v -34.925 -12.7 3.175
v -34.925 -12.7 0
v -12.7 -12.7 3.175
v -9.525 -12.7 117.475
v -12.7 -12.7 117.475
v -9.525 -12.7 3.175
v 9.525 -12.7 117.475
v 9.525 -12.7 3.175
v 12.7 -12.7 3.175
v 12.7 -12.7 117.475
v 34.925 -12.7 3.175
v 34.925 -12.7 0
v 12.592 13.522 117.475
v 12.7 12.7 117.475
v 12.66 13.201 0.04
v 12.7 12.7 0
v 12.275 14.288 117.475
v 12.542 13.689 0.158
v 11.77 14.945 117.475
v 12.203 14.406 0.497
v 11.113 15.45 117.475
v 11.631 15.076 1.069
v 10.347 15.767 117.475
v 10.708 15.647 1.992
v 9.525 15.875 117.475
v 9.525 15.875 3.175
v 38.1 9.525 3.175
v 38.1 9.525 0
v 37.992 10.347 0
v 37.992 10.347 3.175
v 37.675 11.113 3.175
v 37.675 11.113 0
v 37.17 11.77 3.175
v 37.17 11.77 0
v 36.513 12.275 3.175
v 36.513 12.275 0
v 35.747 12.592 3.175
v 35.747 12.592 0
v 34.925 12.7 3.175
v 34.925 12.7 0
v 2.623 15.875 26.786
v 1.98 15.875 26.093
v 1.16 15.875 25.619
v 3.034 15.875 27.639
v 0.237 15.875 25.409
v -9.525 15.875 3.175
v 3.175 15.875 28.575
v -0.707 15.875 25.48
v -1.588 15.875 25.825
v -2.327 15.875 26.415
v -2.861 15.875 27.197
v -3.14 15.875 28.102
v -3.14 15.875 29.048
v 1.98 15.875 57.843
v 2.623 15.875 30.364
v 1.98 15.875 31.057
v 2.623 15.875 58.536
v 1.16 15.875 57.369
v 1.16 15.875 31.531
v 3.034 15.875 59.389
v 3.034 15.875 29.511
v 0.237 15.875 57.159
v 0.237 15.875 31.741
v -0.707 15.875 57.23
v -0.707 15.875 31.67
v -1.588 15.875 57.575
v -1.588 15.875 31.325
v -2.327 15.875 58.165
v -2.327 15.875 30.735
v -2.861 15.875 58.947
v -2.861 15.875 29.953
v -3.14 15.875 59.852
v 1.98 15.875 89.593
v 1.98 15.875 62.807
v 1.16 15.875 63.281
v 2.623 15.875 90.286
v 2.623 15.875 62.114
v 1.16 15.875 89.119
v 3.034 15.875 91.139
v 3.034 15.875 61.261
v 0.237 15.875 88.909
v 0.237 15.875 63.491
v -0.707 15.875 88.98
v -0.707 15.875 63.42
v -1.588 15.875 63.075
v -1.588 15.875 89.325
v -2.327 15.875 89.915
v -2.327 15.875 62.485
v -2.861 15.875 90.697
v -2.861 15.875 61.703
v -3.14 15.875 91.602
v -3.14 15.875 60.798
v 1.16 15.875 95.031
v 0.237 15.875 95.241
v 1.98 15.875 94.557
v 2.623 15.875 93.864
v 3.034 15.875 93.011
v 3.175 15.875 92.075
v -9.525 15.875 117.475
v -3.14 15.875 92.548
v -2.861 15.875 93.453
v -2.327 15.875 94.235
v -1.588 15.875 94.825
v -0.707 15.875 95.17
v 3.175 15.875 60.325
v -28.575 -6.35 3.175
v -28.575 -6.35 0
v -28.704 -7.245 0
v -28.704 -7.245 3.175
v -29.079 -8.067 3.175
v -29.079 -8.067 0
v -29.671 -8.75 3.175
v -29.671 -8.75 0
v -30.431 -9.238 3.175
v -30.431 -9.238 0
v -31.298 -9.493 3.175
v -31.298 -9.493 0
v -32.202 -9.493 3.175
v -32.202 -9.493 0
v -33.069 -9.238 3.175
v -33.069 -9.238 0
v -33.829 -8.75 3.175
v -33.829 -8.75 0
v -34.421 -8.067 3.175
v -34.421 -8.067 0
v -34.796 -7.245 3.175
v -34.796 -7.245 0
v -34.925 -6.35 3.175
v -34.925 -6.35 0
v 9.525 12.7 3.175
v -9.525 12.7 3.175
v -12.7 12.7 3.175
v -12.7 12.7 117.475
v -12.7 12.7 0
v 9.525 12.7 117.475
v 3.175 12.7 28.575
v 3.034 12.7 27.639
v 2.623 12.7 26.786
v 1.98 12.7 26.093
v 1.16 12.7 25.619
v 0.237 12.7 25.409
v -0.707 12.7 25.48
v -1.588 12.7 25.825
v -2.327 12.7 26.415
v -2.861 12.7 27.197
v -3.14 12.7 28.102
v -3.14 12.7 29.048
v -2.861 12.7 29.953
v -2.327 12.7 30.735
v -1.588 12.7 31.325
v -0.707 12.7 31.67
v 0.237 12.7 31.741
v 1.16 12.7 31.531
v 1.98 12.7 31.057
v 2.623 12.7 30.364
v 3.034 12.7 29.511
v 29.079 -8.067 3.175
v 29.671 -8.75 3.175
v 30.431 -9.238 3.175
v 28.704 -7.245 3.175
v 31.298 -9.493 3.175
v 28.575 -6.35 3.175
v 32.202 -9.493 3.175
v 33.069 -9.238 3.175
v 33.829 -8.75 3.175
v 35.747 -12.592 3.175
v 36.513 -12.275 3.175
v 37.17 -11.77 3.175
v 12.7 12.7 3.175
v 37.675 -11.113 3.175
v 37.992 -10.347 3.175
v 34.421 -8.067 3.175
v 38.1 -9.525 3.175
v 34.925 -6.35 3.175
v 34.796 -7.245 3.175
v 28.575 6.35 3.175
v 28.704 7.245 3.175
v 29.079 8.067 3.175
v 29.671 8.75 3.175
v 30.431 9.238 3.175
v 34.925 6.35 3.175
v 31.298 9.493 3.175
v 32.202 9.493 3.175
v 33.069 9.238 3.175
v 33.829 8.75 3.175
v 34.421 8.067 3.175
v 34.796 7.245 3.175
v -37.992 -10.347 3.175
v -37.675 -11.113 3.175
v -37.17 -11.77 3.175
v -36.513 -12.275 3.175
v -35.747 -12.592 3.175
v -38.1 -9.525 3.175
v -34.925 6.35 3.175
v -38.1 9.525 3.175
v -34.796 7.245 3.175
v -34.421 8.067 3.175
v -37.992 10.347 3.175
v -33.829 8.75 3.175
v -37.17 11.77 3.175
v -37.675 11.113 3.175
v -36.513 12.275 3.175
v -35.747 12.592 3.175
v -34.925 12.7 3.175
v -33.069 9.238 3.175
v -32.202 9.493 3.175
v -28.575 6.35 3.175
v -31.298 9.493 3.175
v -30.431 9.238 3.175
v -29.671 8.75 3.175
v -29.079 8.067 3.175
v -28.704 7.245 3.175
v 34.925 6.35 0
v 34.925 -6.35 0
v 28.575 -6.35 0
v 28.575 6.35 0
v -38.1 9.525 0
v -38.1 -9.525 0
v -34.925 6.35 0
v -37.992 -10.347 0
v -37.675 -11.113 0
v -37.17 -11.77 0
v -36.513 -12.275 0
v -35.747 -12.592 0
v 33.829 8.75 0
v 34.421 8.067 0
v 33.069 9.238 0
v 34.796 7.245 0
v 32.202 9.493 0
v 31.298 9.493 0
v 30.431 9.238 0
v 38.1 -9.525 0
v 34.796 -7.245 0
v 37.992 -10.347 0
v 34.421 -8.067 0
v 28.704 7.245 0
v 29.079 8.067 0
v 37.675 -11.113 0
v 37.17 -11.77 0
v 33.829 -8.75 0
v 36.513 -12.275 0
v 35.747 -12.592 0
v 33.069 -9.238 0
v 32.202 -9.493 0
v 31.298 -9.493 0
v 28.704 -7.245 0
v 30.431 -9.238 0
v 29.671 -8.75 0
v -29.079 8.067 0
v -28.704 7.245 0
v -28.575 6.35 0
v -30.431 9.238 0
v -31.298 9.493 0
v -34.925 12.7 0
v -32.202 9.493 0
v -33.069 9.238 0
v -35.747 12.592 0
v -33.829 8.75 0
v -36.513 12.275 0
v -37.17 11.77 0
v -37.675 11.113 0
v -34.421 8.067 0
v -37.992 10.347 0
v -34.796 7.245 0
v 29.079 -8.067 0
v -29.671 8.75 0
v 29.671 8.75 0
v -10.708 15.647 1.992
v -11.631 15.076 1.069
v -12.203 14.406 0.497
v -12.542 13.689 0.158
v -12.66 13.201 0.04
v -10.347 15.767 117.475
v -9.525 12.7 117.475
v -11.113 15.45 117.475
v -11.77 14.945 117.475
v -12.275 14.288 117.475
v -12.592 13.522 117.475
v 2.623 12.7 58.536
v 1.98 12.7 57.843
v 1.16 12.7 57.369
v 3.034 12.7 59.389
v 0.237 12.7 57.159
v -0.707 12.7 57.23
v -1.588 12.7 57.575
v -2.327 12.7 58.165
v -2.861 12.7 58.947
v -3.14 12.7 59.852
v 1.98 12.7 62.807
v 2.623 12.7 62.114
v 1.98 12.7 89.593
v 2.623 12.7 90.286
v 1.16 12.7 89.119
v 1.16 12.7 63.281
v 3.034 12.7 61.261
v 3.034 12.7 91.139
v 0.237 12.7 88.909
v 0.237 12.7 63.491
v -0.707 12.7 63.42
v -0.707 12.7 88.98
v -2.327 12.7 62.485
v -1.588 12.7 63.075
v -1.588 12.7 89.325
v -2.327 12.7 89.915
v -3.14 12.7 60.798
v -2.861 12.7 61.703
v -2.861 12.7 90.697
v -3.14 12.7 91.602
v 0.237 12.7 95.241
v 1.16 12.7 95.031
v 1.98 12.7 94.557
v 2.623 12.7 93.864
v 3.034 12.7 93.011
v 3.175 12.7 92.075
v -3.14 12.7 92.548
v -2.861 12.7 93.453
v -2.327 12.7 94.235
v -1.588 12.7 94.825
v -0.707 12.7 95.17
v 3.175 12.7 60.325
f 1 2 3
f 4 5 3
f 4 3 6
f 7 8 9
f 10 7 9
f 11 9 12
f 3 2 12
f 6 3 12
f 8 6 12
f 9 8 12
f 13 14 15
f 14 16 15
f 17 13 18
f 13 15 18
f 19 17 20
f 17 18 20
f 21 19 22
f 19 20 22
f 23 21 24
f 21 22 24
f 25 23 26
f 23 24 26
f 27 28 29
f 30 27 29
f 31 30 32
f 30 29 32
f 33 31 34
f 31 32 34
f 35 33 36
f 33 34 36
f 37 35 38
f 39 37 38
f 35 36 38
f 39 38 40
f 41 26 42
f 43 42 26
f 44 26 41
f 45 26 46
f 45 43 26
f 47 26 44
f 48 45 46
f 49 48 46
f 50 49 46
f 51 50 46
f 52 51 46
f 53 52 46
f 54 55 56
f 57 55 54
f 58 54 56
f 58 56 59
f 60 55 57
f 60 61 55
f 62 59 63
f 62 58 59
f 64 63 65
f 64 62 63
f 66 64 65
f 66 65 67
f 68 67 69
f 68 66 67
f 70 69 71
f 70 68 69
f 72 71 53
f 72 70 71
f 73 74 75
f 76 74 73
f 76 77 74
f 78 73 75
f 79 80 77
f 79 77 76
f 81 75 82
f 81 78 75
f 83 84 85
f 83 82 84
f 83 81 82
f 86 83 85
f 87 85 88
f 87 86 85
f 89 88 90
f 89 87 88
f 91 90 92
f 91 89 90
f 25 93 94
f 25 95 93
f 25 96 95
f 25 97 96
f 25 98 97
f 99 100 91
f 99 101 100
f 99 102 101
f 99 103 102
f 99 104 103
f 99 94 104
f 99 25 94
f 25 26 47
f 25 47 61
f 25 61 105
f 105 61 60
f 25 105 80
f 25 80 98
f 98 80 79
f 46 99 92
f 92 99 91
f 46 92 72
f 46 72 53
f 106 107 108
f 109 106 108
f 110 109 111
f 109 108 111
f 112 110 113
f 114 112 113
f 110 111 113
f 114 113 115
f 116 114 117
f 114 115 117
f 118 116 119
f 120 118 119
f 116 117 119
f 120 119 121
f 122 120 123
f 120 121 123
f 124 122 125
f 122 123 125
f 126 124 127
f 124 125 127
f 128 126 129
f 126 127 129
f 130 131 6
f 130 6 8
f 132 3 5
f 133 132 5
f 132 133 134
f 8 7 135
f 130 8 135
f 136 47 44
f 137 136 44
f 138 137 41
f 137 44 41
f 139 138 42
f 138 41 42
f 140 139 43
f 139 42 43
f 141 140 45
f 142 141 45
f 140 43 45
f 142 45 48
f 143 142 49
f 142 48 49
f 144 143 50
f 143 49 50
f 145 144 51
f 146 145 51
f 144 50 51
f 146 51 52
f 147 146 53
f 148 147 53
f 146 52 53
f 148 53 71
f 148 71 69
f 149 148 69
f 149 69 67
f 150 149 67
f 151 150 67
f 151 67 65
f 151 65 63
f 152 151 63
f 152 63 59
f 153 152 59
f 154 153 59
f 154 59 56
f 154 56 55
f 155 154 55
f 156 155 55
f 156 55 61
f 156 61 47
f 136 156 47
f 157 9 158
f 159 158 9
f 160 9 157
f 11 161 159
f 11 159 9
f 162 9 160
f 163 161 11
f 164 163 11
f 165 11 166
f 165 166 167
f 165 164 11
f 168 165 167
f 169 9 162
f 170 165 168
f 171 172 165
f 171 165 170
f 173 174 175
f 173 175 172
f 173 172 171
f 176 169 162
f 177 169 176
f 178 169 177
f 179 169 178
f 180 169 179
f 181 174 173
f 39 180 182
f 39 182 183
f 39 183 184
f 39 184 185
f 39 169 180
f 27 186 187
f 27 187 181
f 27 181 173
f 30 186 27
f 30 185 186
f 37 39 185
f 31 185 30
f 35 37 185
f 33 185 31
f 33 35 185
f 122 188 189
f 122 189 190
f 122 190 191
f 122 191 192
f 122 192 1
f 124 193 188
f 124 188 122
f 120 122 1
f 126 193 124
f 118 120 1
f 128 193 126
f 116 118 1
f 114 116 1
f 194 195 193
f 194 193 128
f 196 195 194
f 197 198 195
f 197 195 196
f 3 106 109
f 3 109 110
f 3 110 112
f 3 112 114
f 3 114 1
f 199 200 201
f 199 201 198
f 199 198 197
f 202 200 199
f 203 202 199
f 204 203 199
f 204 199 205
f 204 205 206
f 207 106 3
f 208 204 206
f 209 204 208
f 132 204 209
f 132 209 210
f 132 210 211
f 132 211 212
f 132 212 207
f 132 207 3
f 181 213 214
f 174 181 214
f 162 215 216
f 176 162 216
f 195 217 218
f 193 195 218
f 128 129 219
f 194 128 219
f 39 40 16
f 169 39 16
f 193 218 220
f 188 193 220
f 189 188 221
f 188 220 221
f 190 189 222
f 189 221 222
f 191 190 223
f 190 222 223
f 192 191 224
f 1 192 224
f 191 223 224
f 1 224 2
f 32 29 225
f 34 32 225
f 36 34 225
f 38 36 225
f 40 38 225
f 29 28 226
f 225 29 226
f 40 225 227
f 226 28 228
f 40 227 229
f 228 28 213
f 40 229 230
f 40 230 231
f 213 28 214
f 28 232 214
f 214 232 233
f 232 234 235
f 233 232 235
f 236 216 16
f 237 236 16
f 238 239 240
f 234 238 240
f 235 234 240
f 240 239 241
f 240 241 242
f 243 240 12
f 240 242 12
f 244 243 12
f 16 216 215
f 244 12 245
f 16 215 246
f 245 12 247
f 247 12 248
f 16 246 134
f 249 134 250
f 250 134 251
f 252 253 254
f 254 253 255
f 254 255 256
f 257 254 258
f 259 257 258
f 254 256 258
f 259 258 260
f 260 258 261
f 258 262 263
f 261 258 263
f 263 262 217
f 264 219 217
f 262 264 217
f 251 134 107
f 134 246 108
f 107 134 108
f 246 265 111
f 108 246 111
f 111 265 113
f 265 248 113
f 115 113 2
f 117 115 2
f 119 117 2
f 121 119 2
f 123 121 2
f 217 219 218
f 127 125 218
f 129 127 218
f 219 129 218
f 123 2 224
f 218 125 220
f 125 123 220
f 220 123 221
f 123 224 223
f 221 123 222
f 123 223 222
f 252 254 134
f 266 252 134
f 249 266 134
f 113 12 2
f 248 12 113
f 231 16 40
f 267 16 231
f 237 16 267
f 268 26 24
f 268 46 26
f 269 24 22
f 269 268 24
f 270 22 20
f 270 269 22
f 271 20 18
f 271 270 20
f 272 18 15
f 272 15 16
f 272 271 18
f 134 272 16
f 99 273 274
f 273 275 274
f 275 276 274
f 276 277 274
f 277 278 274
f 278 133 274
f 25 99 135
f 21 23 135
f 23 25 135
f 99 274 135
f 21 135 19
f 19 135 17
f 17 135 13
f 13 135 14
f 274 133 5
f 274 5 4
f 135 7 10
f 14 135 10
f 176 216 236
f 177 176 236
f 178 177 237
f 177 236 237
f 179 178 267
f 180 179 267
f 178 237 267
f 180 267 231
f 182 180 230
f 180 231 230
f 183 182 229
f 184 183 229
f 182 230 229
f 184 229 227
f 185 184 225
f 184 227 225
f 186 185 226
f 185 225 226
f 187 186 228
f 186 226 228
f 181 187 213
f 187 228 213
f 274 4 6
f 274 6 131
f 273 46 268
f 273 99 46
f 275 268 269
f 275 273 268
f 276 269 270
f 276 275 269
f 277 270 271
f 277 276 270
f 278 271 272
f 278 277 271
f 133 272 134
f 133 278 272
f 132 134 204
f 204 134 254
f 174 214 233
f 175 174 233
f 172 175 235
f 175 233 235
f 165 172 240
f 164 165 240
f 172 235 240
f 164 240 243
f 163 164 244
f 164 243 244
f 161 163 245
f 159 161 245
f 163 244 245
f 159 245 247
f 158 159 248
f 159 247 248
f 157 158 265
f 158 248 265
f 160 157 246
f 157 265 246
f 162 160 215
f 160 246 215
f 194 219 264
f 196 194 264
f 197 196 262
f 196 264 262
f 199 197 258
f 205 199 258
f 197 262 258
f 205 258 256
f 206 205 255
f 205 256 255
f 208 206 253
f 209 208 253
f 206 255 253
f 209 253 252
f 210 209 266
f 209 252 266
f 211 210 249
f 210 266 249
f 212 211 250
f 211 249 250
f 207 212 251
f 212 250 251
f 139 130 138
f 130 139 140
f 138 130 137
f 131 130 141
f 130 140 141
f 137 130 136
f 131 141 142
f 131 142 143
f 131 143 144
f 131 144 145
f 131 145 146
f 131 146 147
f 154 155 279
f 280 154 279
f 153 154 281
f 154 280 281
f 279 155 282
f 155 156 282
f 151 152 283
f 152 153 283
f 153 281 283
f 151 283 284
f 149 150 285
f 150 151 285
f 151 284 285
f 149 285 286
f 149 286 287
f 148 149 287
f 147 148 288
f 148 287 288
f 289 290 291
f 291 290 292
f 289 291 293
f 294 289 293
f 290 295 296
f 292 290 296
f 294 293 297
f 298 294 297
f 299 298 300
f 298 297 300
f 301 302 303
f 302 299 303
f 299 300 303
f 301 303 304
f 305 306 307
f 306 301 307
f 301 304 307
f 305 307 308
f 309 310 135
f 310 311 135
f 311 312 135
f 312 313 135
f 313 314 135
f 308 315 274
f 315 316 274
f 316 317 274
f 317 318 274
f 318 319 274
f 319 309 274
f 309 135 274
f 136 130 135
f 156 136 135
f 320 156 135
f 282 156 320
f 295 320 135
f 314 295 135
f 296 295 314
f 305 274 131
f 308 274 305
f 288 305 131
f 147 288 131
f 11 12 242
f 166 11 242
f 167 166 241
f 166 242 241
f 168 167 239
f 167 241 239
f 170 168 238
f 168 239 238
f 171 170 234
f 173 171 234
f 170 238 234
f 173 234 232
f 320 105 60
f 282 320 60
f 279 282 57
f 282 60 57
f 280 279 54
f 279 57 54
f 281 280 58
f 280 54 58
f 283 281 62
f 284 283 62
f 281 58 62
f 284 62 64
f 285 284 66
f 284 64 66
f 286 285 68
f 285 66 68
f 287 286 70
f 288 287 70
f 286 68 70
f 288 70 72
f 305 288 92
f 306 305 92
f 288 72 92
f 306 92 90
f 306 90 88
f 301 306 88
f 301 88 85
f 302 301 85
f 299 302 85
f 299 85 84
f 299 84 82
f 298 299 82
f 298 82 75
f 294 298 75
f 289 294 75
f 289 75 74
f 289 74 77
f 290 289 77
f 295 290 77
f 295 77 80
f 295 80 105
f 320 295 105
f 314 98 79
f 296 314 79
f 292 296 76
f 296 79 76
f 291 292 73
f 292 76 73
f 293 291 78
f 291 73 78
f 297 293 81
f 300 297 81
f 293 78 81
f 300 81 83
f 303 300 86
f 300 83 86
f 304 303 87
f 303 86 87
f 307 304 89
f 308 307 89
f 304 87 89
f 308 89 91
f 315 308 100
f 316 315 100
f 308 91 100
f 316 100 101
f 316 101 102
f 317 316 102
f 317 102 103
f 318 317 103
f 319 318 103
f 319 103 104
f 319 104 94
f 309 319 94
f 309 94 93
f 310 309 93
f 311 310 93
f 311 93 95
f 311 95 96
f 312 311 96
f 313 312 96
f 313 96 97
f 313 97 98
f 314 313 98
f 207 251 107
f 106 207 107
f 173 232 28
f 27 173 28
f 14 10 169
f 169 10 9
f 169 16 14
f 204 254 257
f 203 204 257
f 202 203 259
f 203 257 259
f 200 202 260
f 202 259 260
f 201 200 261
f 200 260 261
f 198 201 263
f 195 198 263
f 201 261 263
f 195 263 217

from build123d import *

# Parameters (mm, degrees)
F1_DEPTH = 3.175
F2_W     = 3.175
F2_H     = 25.4
F3_DEPTH = 114.3
F4_W     = 3.175
F4_H     = 114.3
F4_W_2   = 19.05
F4_H_2   = 3.175
F5_DEPTH = 3.175
F6_D     = 6.35
F7_R     = 3.17499


# Not quite as in the source:
# - a fillet or chamfer is up to 0.001 mm smaller than in the source, because OpenCascade refuses the exact size


with BuildPart() as f1:
    # F0 (on Top) → F1 (new body)
    with BuildSketch(Plane.XY):
        with BuildLine():
            Line((34.925, 12.7), (-34.925, 12.7))
            ThreePointArc((-34.925, 12.7), (-37.1700640303, 11.7700640303), (-38.1, 9.525))
            Line((-38.1, 9.525), (-38.1, -9.525))
            ThreePointArc((-38.1, -9.525), (-37.1700640303, -11.7700640303), (-34.925, -12.7))
            Line((-34.925, -12.7), (34.925, -12.7))
            ThreePointArc((34.925, -12.7), (37.1700640303, -11.7700640303), (38.1, -9.525))
            Line((38.1, -9.525), (38.1, 9.525))
            ThreePointArc((38.1, 9.525), (37.1700640303, 11.7700640303), (34.925, 12.7))
        make_face()
        with BuildLine():
            Line((-34.925, -6.35), (-34.925, 6.35))
            ThreePointArc((-34.925, 6.35), (-31.75, 9.525), (-28.575, 6.35))
            Line((-28.575, 6.35), (-28.575, -6.35))
            ThreePointArc((-28.575, -6.35), (-31.75, -9.525), (-34.925, -6.35))
        make_face(mode=Mode.SUBTRACT)
        with BuildLine():
            Line((28.575, -6.35), (28.575, 6.35))
            ThreePointArc((28.575, 6.35), (31.75, 9.525), (34.925, 6.35))
            Line((34.925, 6.35), (34.925, -6.35))
            ThreePointArc((34.925, -6.35), (31.75, -9.525), (28.575, -6.35))
        make_face(mode=Mode.SUBTRACT)
    extrude(amount=F1_DEPTH)

    # F2 (on face) → F3 (join)
    with BuildSketch(Plane.XY.offset(3.175)):
        with Locations((11.1125, 0)):
            Rectangle(F2_W, F2_H)
        with Locations((-11.1125, 0)):
            Rectangle(F2_W, F2_H)
    extrude(amount=F3_DEPTH)

    # F4 (on face) → F5 (join)
    with BuildSketch(Plane(origin=(0, 12.7, 0), x_dir=(-1, 0, 0), z_dir=(0, 1, 0))):
        with Locations((-11.1125, 60.325)):
            Rectangle(F4_W, F4_H)
        with Locations((0, 60.325)):
            Rectangle(F4_W_2, F4_H)
        with Locations((11.1125, 60.325)):
            Rectangle(F4_W, F4_H)
        with Locations((0, 1.5875)):
            Rectangle(F4_W_2, F4_H_2)
        with Locations((-11.1125, 1.5875)):
            Rectangle(F4_W, F4_H_2)
        with Locations((11.1125, 1.5875)):
            Rectangle(F4_W, F4_H_2)
    extrude(amount=F5_DEPTH)

    # F6 (through all)
    with Locations(Plane(origin=(0, 12.7, 0), x_dir=(-1, 0, 0), z_dir=(0, -1, 0))):
        with Locations((0, -28.575), (0, -60.325), (0, -92.075)):
            Hole(F6_D / 2)

    # F7 (radius 3.175 in the source; OpenCascade refuses exactly that, so slightly less here)
    f7_edges = [f1.edges().sort_by_distance(p)[0] for p in [
        (0, 15.875, 0),
        (12.7, 15.875, 58.7375),
        (-12.7, 15.875, 58.7375),
    ]]
    fillet(f7_edges, radius=F7_R)


solid = f1.part
